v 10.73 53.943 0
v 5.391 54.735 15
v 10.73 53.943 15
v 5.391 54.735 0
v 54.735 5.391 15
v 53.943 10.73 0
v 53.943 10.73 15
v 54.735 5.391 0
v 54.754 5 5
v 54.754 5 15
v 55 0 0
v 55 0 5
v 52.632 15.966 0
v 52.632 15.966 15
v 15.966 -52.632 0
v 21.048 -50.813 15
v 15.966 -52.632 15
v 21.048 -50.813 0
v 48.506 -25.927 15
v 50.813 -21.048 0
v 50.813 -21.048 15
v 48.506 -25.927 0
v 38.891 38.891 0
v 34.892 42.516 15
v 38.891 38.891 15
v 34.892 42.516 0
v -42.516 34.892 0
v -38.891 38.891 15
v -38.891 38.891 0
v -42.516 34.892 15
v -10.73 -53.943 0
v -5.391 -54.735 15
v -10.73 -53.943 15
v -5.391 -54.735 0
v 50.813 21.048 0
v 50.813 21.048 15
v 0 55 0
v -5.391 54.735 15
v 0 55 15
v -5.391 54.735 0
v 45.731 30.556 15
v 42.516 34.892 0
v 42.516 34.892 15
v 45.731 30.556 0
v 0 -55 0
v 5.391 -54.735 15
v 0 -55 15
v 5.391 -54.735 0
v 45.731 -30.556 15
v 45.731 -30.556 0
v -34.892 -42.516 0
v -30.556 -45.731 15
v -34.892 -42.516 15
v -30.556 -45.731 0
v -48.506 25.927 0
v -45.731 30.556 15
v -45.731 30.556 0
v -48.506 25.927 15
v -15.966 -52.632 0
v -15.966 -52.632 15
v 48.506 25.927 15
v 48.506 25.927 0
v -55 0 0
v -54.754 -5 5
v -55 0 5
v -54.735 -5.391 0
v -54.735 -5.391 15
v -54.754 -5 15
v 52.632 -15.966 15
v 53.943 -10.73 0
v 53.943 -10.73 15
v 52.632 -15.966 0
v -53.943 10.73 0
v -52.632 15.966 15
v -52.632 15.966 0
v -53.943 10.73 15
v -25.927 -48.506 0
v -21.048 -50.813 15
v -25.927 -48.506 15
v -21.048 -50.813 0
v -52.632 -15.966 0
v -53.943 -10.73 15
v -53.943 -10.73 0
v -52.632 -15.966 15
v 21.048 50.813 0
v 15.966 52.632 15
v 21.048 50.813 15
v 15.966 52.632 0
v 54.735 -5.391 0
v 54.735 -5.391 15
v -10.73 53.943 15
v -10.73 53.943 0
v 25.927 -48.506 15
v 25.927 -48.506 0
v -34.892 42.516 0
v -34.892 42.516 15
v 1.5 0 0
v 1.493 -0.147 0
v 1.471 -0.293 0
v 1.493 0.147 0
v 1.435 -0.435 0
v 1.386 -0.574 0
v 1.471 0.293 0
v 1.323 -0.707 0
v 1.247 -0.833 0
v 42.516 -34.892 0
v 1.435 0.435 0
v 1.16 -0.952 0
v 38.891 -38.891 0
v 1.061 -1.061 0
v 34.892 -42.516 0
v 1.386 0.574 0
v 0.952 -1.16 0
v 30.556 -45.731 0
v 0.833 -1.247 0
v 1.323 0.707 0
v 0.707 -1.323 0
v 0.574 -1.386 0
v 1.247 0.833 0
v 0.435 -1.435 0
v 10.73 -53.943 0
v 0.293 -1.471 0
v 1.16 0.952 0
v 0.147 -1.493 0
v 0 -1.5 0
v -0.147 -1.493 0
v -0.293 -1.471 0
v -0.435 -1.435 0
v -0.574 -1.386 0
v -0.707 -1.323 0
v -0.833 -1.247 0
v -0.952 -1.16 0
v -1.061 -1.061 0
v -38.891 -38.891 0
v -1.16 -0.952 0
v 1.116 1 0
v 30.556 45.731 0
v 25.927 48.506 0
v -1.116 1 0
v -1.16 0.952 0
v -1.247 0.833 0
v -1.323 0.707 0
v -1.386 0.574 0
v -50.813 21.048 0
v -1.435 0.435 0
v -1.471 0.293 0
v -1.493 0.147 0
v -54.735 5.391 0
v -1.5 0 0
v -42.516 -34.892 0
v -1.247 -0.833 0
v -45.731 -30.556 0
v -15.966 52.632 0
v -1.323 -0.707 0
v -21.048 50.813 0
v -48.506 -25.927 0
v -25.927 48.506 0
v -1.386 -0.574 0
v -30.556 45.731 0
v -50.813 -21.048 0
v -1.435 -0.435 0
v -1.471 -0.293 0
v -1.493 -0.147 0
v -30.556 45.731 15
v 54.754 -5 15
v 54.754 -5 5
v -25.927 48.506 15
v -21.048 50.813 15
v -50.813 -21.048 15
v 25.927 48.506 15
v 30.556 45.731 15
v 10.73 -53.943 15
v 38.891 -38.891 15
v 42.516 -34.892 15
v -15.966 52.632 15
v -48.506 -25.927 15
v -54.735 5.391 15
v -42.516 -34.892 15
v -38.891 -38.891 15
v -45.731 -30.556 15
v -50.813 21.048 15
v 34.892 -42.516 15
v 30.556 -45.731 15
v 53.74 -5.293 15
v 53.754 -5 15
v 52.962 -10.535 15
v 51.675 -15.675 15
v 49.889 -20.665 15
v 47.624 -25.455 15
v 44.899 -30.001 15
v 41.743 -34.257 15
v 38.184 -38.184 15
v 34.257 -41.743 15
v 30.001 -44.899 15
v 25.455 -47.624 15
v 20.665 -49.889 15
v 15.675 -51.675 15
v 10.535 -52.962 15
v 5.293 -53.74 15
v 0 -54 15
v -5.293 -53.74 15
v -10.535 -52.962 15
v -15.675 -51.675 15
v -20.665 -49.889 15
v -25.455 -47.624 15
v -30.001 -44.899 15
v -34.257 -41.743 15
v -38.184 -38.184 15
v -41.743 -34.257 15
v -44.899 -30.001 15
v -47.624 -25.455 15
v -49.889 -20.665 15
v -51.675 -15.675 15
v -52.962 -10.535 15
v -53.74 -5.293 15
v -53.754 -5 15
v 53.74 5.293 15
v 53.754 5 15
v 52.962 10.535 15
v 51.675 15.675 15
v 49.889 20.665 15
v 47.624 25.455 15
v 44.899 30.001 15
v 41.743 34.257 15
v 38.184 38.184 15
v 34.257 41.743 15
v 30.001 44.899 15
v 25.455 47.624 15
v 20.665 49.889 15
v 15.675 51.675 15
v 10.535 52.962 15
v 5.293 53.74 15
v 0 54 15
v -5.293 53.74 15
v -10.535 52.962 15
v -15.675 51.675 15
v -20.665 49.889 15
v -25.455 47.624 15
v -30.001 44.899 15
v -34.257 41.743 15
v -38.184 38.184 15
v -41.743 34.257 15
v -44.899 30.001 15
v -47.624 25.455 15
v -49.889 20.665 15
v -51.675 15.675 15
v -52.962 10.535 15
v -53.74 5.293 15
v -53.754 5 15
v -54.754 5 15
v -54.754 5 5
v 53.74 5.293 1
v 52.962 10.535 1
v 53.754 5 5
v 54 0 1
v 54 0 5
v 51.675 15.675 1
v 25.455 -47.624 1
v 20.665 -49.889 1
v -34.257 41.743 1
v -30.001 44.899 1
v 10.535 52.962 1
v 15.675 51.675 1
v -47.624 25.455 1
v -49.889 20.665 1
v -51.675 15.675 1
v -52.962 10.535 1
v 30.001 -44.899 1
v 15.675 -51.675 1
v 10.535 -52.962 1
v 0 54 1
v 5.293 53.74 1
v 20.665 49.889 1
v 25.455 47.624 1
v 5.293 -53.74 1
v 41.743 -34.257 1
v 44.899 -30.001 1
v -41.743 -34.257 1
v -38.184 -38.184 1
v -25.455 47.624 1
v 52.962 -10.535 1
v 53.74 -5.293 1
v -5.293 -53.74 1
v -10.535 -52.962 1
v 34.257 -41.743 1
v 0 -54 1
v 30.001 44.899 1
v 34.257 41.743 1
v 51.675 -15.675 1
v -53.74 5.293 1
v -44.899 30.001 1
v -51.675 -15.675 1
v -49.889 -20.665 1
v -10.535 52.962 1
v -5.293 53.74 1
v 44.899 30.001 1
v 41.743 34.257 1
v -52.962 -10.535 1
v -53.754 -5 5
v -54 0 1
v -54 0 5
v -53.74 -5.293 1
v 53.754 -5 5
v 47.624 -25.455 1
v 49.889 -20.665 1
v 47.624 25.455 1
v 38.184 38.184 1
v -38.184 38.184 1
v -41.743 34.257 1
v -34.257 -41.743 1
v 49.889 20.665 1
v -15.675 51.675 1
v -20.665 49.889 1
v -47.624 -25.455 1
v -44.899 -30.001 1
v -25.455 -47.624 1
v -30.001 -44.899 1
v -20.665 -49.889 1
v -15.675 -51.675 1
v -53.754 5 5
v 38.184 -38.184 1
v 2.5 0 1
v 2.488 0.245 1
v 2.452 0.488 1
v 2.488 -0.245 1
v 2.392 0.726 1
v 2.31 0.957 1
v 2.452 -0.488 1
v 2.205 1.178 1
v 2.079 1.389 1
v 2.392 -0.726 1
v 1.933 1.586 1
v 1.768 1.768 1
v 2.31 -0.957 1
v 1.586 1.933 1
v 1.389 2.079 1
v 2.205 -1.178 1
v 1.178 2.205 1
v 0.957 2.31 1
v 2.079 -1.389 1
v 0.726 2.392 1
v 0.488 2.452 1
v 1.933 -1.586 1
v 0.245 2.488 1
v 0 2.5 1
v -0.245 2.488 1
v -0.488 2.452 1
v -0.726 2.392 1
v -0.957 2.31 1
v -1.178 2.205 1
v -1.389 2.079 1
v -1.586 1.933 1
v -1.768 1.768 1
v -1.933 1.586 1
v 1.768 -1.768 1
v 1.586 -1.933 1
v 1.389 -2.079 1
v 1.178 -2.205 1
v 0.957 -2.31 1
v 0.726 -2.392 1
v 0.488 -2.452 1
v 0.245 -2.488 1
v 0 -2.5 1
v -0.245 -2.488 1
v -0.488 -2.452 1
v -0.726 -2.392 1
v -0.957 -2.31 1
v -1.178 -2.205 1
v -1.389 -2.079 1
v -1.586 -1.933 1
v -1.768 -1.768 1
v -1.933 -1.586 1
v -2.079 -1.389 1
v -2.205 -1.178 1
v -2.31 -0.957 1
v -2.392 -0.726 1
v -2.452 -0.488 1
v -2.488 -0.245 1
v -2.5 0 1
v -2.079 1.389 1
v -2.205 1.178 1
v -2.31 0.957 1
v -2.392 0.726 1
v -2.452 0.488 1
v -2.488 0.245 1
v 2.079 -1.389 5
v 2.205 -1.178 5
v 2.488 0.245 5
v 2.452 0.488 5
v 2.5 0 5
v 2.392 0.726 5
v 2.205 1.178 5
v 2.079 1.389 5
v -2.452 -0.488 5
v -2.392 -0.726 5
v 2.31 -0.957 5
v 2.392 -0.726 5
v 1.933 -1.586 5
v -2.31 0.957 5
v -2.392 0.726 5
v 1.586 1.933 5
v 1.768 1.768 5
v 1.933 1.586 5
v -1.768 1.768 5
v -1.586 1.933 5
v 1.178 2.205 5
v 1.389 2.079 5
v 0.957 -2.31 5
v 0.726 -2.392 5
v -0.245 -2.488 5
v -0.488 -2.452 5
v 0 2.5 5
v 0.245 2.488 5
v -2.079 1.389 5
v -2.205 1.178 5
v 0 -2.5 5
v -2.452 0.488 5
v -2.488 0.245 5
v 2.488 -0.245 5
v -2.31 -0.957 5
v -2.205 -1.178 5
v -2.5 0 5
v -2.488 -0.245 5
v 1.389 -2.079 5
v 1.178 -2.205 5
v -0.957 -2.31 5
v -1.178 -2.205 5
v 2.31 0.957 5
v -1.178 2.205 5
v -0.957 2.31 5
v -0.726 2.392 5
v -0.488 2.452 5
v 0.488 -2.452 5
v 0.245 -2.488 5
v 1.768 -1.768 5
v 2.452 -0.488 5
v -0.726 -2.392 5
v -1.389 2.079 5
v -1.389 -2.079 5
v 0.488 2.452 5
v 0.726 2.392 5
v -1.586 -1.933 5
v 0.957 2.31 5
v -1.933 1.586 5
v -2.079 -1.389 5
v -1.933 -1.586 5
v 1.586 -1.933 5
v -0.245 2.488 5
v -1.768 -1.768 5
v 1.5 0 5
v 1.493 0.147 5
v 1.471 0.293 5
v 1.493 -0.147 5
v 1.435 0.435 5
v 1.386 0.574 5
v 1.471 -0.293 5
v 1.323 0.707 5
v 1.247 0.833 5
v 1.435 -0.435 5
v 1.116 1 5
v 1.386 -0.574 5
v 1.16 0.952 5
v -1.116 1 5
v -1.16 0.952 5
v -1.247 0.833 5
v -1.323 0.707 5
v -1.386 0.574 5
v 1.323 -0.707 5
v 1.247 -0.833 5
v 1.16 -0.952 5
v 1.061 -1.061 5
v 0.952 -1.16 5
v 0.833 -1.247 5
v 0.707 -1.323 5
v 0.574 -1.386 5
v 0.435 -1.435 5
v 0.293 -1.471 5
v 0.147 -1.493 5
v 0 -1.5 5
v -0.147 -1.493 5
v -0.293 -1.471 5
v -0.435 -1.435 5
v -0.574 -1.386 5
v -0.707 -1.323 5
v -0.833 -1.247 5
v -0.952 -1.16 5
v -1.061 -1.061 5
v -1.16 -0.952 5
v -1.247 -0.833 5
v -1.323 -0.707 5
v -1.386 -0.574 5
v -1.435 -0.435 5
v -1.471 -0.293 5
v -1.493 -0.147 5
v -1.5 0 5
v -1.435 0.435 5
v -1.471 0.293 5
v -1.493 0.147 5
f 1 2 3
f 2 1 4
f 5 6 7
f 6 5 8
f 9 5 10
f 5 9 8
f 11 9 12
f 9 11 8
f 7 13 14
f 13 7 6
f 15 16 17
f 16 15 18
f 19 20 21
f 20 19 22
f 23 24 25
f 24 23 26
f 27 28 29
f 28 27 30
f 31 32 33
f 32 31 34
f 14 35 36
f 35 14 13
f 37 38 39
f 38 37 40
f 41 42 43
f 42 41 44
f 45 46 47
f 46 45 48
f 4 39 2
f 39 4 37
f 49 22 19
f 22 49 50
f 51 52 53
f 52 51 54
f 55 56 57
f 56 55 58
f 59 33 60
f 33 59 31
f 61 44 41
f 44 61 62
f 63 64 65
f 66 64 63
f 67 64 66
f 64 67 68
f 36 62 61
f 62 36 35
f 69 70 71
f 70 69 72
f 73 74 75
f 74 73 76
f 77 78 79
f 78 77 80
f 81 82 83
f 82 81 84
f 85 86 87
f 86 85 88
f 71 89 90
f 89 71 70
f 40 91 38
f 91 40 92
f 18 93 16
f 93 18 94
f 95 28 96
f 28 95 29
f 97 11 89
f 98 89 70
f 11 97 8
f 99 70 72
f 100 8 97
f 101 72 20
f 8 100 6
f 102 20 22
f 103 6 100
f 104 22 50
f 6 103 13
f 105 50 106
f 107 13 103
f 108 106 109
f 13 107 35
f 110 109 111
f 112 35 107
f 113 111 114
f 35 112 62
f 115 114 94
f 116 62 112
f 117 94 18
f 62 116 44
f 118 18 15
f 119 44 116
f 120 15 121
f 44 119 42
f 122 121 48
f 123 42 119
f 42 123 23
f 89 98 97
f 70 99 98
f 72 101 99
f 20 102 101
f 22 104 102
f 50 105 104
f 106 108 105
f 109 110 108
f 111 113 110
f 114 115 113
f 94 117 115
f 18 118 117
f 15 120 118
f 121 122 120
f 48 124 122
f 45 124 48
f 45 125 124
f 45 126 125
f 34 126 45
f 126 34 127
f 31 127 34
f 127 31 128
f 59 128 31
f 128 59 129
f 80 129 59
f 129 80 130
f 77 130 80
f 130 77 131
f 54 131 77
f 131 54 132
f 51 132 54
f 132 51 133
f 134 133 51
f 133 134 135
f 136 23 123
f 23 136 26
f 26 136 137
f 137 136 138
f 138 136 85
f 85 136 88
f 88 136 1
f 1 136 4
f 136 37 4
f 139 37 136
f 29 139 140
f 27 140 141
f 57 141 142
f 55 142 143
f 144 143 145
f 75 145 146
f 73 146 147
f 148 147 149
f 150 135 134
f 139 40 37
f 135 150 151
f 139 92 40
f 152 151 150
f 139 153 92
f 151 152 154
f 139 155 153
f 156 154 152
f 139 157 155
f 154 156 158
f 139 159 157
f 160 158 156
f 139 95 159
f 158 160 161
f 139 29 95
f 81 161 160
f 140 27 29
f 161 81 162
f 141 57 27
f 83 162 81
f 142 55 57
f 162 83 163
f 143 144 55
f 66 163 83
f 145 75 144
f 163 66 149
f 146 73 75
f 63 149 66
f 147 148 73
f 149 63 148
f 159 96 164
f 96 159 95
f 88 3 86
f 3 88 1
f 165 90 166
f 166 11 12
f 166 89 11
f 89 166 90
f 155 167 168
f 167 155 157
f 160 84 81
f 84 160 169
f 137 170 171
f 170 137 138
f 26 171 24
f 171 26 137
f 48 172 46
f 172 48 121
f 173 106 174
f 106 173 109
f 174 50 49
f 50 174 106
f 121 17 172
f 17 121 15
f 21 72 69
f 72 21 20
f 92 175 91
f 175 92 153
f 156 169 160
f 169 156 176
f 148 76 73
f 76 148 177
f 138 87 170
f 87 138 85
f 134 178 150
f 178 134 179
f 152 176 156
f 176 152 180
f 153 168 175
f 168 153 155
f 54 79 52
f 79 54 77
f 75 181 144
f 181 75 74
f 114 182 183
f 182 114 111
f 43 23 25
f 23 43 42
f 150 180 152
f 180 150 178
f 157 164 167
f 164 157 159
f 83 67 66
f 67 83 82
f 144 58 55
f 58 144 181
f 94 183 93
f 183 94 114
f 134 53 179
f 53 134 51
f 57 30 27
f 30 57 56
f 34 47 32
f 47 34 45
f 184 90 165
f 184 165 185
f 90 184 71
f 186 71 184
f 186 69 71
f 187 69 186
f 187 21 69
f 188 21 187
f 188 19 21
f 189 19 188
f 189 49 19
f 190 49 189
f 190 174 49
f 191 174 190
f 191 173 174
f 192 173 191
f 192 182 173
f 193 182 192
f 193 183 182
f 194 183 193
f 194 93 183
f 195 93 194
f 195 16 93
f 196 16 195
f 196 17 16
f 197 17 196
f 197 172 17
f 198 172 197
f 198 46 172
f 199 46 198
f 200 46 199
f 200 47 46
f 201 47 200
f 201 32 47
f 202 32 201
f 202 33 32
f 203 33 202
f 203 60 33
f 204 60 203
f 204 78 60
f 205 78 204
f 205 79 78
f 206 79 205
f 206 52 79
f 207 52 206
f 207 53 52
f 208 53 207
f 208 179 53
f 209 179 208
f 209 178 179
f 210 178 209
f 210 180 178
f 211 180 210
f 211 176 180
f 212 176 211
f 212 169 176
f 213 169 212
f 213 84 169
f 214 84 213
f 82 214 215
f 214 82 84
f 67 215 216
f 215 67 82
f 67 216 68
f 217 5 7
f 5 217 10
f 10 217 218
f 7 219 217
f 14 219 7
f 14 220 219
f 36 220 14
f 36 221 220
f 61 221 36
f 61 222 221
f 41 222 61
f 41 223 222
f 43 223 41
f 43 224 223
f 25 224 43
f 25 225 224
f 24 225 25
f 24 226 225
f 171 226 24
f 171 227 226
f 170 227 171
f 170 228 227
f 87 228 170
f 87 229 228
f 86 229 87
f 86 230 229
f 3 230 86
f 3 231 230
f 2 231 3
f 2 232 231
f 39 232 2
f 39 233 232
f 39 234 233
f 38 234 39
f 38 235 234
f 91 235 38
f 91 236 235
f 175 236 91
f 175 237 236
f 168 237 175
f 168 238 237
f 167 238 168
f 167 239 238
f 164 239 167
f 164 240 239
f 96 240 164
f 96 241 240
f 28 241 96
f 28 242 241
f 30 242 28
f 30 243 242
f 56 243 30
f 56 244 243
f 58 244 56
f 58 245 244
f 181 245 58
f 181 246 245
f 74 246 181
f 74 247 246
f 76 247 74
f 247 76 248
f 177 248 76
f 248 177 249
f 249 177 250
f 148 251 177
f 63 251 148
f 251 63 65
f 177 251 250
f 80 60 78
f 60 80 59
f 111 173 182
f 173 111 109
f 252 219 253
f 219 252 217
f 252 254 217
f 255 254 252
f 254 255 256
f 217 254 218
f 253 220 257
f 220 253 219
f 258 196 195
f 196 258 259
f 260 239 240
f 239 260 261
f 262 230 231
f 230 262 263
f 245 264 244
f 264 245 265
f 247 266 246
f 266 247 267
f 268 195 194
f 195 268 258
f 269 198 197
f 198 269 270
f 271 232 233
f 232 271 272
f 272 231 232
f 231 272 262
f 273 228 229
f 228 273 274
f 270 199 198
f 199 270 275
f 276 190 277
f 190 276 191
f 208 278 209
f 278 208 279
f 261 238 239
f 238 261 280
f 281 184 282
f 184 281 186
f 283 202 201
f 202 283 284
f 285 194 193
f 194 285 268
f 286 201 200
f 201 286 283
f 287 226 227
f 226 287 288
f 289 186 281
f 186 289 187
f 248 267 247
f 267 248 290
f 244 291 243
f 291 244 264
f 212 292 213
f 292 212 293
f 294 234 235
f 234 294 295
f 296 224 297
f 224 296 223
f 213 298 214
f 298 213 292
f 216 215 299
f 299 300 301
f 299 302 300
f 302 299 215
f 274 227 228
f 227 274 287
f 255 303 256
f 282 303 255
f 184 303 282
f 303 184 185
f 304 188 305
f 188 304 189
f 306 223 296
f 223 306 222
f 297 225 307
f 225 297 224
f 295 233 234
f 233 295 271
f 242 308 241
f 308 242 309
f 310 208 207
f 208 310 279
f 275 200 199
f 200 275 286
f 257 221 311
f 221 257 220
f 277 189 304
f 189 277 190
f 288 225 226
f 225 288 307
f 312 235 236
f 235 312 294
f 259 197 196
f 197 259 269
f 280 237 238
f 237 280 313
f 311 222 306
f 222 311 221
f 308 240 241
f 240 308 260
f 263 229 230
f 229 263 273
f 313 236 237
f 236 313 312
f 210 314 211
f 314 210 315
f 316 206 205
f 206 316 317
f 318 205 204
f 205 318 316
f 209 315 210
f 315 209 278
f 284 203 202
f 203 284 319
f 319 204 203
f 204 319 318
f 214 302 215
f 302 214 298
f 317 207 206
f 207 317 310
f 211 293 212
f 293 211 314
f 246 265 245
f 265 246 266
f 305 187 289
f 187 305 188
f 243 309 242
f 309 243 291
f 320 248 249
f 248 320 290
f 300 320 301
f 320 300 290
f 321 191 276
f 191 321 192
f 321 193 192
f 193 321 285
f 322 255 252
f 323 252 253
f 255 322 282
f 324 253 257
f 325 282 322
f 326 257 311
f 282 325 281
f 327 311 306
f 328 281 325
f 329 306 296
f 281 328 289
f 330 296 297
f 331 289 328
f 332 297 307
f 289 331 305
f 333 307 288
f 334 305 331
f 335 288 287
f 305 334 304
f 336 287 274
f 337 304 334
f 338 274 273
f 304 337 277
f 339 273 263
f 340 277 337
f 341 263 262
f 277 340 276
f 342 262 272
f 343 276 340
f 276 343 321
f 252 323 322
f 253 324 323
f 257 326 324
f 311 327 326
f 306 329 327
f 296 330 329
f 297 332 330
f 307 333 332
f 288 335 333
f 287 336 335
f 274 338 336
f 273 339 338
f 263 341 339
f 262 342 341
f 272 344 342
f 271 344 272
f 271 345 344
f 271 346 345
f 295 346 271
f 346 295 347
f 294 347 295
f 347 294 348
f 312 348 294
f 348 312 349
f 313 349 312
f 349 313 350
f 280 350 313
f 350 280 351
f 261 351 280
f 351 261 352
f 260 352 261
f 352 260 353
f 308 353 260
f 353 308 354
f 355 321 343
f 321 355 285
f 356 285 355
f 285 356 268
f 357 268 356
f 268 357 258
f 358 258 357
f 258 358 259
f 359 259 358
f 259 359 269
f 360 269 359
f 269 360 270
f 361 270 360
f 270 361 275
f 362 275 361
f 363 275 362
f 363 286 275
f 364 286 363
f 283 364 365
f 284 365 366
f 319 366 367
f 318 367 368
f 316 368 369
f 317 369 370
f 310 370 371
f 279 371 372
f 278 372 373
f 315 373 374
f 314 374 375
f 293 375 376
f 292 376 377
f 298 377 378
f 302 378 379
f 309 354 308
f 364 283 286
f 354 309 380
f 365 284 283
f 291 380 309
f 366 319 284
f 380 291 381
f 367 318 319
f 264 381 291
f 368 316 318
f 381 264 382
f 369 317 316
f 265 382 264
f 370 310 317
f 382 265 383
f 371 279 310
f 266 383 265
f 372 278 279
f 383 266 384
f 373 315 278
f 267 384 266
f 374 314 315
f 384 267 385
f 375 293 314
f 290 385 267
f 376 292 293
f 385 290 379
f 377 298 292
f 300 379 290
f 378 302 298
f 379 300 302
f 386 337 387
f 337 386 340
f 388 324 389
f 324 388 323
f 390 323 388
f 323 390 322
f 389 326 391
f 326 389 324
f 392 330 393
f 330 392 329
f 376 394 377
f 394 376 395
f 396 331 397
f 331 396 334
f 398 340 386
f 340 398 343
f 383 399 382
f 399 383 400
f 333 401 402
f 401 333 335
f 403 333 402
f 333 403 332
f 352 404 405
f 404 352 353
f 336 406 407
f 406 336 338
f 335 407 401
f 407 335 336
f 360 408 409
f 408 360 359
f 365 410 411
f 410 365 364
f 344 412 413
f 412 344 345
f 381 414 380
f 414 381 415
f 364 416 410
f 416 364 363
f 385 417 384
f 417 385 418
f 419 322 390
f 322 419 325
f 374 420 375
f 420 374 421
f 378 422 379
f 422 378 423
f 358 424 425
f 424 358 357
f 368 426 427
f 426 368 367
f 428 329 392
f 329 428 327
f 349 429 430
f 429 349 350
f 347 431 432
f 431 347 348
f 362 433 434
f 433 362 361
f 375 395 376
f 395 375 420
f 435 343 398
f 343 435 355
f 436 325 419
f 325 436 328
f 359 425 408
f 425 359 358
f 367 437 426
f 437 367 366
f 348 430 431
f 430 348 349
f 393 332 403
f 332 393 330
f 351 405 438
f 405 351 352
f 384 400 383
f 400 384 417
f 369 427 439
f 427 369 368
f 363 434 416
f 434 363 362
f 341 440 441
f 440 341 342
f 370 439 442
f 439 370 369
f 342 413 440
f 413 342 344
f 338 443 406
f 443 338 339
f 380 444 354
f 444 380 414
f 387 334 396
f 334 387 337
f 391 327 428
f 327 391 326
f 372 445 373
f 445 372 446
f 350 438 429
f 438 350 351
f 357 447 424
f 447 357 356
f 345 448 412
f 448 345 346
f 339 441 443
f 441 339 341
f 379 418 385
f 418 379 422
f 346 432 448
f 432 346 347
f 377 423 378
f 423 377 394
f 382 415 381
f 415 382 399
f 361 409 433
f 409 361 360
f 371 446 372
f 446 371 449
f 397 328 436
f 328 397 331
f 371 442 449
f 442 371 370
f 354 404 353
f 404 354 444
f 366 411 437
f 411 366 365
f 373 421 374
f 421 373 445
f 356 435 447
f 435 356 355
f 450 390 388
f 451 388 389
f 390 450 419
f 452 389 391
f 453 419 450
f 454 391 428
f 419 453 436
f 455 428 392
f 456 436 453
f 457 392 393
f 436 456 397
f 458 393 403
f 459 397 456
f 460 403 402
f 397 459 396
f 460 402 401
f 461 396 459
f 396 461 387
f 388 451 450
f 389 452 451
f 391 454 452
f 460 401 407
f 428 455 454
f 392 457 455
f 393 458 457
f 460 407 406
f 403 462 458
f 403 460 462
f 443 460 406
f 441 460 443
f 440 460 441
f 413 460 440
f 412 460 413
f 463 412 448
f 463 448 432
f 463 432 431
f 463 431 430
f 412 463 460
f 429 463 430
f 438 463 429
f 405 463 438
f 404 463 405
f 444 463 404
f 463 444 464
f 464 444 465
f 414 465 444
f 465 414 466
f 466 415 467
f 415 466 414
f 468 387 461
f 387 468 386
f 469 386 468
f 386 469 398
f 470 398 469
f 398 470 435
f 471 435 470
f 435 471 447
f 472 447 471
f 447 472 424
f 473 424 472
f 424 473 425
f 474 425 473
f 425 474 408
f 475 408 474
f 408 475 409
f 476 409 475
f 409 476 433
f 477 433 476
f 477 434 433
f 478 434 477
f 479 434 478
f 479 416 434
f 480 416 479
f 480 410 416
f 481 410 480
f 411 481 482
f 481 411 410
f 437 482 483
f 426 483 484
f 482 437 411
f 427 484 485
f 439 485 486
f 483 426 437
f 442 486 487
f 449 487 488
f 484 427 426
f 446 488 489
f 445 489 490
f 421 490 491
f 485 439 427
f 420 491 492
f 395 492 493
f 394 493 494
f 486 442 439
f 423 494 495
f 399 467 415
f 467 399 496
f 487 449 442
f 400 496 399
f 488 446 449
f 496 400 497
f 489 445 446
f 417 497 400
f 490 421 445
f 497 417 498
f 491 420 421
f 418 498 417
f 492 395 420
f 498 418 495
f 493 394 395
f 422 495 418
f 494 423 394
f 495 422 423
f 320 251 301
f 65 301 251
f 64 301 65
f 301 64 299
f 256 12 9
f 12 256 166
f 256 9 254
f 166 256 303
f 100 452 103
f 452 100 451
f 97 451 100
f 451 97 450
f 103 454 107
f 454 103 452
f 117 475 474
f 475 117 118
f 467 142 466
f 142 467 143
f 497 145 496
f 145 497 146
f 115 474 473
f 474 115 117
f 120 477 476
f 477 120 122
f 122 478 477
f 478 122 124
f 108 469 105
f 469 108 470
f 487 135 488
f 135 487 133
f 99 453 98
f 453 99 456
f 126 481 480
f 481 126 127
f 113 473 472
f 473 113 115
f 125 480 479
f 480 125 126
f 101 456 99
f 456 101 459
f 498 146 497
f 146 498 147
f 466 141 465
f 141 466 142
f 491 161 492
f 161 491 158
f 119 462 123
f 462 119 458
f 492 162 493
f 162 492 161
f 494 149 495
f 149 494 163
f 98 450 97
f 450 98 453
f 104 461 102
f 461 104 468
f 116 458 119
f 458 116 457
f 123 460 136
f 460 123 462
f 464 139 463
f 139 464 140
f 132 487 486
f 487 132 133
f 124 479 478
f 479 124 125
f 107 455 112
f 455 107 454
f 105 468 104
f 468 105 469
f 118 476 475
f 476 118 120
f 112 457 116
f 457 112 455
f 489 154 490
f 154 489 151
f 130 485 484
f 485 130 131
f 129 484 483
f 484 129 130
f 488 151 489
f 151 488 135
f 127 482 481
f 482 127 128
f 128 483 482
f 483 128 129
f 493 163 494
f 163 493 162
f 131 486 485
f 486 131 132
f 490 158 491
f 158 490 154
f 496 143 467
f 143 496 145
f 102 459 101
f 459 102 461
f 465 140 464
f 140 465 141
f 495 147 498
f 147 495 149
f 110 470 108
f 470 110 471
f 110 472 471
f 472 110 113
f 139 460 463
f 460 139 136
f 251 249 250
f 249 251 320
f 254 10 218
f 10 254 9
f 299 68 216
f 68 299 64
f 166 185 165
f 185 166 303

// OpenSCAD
polomer = 55;
stena = 1;
vyska = 15;

// kolik
prumer_dira = 3;
dira_oseknuti = 2.5;
prumer_kolik = 5;
vyska_kolik = 5;

//vyrez
vyrez_sirka = 10;

$fn= 64;

difference() {
    union () {
        difference() {
            cylinder(vyska, r = polomer);
            translate([0,0,stena])
                cylinder(vyska, r = polomer-stena);
        };
        cylinder(vyska_kolik, d = prumer_kolik);
    }
    union()
    {
        difference()
        {
            cylinder(vyska, d = prumer_dira);
            translate([-prumer_dira/2,dira_oseknuti-prumer_dira/2,0])
                cube([prumer_dira,prumer_dira,vyska_kolik]);
            
        }
        translate([0,0,10])
        cube([polomer*2,10,10], true);
    }
};
